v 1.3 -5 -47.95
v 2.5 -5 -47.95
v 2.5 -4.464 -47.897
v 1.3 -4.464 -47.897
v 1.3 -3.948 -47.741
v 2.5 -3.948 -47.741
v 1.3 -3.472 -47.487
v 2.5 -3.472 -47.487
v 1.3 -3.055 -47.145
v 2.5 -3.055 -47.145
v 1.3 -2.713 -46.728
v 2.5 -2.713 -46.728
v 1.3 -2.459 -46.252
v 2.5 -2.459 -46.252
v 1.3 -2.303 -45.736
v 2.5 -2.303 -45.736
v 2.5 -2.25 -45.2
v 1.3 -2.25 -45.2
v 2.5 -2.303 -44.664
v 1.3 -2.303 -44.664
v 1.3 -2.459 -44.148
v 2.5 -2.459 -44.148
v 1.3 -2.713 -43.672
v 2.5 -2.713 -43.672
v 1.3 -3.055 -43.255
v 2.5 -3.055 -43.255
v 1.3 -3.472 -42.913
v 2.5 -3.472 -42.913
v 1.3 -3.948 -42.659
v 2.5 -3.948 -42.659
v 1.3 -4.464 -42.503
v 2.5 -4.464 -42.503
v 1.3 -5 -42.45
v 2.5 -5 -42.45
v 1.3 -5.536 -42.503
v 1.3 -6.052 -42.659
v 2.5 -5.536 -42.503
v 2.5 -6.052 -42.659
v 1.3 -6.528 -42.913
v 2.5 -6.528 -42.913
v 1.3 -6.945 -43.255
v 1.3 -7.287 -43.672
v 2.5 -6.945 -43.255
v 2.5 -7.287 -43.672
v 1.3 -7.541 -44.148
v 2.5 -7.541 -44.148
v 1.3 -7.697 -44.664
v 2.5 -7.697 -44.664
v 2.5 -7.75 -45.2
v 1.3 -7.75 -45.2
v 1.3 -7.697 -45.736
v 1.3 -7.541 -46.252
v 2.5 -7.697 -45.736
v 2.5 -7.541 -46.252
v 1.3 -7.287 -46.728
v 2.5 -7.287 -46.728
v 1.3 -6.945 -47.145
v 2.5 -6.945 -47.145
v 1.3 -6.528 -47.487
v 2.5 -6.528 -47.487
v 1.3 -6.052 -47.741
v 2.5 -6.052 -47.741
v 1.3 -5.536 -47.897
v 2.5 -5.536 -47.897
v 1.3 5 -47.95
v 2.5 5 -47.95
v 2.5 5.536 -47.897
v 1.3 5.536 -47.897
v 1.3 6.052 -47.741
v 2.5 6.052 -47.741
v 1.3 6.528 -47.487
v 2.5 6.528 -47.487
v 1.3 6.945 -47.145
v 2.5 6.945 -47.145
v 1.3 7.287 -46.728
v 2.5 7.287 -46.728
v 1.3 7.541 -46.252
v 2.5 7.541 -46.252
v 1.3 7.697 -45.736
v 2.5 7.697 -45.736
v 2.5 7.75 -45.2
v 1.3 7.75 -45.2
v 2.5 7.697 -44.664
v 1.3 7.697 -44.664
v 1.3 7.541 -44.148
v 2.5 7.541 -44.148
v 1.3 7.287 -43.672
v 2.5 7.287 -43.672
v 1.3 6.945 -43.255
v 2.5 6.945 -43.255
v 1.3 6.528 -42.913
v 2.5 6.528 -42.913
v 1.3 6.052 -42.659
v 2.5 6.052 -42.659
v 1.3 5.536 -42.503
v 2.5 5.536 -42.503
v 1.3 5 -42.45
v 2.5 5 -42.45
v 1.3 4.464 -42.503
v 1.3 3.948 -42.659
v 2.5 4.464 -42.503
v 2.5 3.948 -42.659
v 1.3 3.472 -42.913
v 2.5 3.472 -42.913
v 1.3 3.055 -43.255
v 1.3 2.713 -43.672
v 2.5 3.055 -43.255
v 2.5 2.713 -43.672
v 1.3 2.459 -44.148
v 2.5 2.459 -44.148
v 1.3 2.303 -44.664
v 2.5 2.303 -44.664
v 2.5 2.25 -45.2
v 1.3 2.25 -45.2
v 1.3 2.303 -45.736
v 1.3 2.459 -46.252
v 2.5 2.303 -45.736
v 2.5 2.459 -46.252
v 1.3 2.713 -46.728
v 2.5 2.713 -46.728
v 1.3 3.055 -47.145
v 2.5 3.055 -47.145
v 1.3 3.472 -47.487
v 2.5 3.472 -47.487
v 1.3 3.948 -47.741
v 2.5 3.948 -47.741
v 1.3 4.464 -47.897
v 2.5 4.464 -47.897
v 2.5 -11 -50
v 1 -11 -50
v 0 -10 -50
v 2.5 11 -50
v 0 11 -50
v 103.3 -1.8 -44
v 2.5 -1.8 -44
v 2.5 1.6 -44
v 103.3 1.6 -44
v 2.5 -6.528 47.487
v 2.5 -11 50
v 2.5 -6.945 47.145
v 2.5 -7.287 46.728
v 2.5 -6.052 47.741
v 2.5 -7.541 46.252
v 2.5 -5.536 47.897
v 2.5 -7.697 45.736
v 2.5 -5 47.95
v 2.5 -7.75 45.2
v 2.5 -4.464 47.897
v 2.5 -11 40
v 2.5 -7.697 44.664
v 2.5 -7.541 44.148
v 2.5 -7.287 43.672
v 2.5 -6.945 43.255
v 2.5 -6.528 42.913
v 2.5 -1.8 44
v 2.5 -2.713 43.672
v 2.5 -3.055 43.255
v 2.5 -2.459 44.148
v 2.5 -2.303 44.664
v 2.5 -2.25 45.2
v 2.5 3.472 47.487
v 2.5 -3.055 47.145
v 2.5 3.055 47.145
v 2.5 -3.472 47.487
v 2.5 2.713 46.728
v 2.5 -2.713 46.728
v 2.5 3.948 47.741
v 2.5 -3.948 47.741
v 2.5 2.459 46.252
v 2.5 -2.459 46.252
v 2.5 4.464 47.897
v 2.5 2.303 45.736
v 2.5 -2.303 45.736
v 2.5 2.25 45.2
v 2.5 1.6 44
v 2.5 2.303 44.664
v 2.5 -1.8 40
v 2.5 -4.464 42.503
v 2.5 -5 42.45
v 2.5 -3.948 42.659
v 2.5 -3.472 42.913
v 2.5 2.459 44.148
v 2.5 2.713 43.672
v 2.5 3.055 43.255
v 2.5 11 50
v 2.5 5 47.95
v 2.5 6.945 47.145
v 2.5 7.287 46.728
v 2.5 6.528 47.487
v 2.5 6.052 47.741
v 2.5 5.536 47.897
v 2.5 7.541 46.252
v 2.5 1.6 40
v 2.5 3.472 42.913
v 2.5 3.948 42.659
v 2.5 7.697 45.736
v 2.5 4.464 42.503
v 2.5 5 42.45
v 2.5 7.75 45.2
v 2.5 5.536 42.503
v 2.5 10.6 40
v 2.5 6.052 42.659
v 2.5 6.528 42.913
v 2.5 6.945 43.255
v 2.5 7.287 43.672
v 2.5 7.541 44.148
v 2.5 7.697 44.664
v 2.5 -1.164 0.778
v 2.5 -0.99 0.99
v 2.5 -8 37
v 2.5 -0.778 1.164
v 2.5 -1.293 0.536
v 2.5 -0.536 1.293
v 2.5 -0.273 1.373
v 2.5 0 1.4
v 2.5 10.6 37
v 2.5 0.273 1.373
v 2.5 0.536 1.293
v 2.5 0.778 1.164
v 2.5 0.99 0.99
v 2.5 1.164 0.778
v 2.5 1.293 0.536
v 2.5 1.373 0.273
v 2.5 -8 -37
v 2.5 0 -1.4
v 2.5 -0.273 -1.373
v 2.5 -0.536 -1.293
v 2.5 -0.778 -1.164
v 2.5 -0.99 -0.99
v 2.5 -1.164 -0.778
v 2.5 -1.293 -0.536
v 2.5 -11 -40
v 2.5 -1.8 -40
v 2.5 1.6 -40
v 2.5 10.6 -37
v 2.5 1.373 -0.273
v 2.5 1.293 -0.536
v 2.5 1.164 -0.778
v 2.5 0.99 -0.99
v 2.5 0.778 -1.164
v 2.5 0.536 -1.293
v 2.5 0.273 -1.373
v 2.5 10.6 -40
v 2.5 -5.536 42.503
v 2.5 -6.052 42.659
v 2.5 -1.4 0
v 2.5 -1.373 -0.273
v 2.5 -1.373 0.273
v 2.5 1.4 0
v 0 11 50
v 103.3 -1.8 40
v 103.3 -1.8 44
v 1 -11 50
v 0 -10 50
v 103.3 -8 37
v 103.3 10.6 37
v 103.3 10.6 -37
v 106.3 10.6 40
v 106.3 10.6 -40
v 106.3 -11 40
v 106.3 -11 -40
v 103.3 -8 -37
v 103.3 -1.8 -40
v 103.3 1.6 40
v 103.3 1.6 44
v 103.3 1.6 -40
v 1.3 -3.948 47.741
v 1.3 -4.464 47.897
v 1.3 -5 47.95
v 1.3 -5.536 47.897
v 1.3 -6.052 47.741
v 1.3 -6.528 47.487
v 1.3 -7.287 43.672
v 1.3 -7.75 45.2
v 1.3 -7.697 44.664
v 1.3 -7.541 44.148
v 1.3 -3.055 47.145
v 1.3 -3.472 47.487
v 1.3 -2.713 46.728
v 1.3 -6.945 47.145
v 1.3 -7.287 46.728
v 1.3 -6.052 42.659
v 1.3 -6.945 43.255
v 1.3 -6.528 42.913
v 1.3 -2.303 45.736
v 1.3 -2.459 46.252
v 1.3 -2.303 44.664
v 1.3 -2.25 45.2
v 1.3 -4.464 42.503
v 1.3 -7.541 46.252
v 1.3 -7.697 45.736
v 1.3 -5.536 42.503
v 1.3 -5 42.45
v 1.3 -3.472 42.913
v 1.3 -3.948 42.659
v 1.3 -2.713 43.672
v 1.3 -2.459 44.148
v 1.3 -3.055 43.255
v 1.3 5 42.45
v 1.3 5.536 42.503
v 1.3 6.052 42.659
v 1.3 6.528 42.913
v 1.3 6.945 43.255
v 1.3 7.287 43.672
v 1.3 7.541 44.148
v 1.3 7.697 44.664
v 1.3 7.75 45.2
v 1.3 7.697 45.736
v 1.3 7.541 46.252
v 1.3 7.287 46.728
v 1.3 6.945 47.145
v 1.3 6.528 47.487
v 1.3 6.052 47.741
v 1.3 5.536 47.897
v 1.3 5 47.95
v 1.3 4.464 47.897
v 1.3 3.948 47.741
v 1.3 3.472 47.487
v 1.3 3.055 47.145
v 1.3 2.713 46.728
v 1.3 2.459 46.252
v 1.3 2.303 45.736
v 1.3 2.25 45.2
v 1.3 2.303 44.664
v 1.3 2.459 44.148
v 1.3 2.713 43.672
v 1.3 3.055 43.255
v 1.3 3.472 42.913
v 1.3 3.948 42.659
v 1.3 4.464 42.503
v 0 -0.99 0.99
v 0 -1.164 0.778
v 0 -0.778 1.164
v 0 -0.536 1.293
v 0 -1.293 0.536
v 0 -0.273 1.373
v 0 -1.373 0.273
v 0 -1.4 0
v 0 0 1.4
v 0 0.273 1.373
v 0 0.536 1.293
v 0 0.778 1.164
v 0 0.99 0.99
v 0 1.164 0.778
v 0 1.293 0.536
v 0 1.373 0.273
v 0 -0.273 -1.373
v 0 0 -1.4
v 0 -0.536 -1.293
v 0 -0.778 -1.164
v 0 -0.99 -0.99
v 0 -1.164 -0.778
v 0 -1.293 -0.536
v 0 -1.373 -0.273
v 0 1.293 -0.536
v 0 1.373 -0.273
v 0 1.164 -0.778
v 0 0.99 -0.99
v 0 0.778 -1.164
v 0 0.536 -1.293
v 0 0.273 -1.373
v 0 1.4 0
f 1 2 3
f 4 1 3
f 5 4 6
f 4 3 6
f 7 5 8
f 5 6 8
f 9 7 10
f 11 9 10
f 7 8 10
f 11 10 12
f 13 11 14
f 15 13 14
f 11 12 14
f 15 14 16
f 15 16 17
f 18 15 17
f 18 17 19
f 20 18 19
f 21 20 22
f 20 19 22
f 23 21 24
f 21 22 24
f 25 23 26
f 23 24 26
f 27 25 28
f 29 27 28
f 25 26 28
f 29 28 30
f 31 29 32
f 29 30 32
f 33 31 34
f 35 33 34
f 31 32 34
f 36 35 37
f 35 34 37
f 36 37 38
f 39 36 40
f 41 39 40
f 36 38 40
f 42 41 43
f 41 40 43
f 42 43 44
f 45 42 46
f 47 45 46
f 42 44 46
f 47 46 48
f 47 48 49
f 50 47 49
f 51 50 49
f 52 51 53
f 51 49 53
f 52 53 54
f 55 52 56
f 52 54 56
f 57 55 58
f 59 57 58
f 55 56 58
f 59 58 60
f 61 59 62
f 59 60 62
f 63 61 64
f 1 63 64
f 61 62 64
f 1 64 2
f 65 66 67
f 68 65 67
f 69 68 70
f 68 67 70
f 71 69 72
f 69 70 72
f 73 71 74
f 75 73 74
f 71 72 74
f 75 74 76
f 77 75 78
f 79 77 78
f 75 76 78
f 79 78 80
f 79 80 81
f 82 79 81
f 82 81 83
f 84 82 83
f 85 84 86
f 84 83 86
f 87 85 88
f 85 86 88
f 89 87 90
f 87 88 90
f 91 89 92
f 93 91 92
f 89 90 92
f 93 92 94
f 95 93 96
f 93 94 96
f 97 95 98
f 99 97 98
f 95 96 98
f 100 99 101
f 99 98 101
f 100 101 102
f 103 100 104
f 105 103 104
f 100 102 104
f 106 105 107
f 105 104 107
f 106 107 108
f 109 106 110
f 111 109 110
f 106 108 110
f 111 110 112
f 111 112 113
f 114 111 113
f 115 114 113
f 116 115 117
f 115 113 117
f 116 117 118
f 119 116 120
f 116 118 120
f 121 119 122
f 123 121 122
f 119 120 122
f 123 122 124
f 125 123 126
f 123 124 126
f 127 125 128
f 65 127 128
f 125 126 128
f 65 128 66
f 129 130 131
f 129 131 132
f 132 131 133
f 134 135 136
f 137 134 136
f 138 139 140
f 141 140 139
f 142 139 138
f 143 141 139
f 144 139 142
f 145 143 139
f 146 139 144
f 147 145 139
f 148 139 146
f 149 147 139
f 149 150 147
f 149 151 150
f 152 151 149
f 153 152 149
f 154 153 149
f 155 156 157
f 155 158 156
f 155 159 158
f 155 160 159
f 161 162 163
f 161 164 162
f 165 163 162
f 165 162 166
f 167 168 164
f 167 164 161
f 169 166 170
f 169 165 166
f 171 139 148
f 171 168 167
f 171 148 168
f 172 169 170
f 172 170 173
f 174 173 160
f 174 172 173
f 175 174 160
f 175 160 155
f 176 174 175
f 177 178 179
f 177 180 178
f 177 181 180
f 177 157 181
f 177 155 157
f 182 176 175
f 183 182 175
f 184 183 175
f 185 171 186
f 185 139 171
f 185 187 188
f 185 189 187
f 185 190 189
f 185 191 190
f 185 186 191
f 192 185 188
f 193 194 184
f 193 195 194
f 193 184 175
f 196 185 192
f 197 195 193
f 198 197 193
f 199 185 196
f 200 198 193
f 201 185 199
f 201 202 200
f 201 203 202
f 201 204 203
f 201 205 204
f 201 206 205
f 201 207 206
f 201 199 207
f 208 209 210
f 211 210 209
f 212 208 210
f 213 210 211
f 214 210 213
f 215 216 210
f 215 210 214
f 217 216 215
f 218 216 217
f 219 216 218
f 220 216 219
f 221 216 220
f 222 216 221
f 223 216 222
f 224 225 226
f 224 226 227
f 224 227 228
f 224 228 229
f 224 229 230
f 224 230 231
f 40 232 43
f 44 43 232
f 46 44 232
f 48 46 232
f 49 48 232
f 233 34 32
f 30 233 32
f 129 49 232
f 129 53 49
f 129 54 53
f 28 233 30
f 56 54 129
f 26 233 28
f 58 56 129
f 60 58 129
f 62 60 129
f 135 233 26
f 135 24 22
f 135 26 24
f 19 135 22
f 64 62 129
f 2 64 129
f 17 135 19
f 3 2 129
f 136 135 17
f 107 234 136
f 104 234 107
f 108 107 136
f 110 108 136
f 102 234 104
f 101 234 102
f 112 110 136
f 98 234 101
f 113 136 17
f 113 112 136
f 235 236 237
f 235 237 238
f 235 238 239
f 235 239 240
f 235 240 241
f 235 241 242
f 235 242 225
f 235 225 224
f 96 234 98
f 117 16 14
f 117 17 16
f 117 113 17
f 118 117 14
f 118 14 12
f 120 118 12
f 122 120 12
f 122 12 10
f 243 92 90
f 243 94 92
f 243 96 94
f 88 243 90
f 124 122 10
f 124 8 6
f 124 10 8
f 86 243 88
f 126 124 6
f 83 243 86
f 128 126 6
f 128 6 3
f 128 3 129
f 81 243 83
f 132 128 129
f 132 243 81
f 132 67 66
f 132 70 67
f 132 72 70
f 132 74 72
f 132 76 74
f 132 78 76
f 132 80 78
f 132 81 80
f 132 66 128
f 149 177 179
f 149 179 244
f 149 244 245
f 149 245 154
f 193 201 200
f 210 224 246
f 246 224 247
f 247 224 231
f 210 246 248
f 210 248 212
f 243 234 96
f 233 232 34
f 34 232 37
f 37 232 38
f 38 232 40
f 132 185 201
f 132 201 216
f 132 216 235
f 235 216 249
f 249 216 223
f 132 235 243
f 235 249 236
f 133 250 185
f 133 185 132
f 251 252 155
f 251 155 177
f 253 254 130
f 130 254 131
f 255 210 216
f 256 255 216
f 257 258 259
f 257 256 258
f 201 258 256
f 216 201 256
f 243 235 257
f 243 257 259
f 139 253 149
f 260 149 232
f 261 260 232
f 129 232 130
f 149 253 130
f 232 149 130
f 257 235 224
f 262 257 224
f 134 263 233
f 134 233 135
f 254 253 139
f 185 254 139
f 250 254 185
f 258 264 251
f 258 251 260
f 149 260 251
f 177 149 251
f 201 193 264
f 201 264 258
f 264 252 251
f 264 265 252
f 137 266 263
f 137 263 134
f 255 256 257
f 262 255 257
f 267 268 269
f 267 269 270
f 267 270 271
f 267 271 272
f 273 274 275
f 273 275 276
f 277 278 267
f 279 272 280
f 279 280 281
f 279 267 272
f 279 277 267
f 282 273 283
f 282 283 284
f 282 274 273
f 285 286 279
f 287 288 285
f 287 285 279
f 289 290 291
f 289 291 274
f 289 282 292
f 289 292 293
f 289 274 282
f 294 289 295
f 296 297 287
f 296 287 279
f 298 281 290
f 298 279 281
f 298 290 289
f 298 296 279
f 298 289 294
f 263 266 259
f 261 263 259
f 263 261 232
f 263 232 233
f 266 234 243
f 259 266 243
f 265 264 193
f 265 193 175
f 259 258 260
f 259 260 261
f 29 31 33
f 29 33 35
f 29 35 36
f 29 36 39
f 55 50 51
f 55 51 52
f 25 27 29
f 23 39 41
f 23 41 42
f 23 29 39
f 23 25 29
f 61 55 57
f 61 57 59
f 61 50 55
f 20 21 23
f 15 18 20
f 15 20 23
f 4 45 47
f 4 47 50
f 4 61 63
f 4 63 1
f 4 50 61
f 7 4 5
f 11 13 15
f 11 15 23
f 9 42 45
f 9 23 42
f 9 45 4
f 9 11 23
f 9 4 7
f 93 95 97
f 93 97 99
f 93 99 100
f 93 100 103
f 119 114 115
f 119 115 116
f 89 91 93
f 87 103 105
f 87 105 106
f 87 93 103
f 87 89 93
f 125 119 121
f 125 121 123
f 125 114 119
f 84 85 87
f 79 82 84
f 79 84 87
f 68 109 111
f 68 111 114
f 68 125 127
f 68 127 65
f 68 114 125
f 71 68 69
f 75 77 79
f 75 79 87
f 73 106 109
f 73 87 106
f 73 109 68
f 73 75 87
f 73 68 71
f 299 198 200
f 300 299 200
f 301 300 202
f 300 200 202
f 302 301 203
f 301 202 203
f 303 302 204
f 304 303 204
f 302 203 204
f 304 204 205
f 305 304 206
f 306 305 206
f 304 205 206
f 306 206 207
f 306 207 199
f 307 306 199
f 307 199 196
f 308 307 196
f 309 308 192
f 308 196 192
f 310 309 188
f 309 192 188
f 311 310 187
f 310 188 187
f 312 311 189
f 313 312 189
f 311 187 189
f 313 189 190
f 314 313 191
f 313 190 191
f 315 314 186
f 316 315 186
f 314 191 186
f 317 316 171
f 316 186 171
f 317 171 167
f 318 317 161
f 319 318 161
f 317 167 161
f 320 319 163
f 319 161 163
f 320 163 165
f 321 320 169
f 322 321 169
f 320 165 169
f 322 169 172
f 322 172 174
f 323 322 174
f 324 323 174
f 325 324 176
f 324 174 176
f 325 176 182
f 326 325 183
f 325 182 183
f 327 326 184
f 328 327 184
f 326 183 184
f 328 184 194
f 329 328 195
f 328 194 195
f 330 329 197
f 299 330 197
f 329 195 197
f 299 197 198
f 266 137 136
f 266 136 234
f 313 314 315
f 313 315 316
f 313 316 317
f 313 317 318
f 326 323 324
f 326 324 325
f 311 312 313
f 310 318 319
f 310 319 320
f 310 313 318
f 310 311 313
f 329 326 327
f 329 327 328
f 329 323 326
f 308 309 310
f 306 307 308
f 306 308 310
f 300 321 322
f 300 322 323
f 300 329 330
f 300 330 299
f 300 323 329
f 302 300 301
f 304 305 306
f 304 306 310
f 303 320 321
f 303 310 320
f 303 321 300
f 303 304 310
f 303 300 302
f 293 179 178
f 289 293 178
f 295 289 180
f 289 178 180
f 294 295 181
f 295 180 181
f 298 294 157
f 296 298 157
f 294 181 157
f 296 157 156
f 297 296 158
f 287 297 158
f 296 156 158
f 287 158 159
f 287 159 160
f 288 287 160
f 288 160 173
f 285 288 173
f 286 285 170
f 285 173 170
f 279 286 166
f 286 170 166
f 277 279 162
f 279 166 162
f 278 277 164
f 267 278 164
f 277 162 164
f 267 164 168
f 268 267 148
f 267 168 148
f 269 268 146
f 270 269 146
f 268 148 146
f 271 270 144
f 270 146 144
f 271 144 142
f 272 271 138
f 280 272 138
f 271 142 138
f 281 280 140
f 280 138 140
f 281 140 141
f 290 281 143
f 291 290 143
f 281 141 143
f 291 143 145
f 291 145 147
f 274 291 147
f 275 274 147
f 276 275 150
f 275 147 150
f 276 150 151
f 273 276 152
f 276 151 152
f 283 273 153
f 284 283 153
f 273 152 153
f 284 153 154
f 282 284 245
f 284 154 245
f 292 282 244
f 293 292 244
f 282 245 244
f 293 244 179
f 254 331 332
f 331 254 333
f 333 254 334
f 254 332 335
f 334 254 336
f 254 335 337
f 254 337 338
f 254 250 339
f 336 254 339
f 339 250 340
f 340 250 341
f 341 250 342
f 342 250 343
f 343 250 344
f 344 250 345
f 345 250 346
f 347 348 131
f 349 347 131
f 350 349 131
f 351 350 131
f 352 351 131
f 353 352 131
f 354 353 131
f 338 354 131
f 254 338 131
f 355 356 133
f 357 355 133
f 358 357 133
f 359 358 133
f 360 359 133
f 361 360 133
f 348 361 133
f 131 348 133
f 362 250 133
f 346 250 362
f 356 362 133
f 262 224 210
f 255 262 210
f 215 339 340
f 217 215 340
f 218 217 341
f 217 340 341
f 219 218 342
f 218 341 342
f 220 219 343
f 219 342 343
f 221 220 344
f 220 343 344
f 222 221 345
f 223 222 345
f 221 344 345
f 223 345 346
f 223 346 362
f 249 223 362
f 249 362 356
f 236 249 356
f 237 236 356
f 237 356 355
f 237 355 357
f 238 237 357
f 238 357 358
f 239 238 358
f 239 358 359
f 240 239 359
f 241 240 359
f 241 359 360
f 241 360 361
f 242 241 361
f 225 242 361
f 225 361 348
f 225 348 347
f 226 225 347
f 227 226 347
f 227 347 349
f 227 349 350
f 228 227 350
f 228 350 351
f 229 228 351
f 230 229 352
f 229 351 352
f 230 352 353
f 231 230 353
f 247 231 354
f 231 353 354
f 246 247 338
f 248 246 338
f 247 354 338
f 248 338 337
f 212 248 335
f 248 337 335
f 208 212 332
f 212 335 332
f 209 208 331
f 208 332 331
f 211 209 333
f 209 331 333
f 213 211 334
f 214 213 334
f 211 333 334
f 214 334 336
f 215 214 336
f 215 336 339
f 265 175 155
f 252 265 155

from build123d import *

# Parameters (mm, degrees)
CROQUIS1_W              = 100
CROQUIS1_H              = 22
SALIENTE_EXTRUIR1_DEPTH = 2.5
CROQUIS4_R              = 2.75
CORTAR_EXTRUIR2_DEPTH   = 1.2
SALIENTE_EXTRUIR2_DEPTH = 100.8
CROQUIS7_W              = 80
CROQUIS7_H              = 21.6
SALIENTE_EXTRUIR3_DEPTH = 3
CROQUIS8_R              = 1.4
CORTAR_EXTRUIR3_DEPTH   = 3
CHAFL_N1_SIZE           = 1


with BuildPart() as part:
    # Croquis1 → Saliente-Extruir1 (new body)
    with BuildSketch(Plane(origin=(0, 0, 0), x_dir=(0, 0, -1), z_dir=(1, 0, 0))):
        Rectangle(CROQUIS1_W, CROQUIS1_H)
    extrude(amount=SALIENTE_EXTRUIR1_DEPTH)

    # Croquis4 → Cortar-Extruir2 (cut)
    with BuildSketch(Plane(origin=(2.5, 0, 0), x_dir=(0, 0, -1), z_dir=(1, 0, 0))):
        with Locations((45.2, 5)):
            Circle(CROQUIS4_R)
        with Locations((45.2, -5)):
            Circle(CROQUIS4_R)
        with Locations((-45.2, 5)):
            Circle(CROQUIS4_R)
        with Locations((-45.2, -5)):
            Circle(CROQUIS4_R)
    extrude(amount=-CORTAR_EXTRUIR2_DEPTH, mode=Mode.SUBTRACT)

    # Croquis6 → Saliente-Extruir2 (add)
    with BuildSketch(Plane(origin=(2.5, 0, 0), x_dir=(0, 0, -1), z_dir=(1, 0, 0))):
        Polygon((-40, -11), (40, -11), (40, -1.8), (44, -1.8), (44, 1.6), (40, 1.6), (40, 10.6), (37, 10.6), (37, -8), (-37, -8), (-37, 10.6), (-40, 10.6), (-40, 1.6), (-44, 1.6), (-44, -1.8), (-40, -1.8), align=None)
    extrude(amount=SALIENTE_EXTRUIR2_DEPTH)

    # Croquis7 → Saliente-Extruir3 (add)
    with BuildSketch(Plane(origin=(103.3, 0, 0), x_dir=(0, 0, -1), z_dir=(1, 0, 0))):
        with Locations((0, -0.2)):
            Rectangle(CROQUIS7_W, CROQUIS7_H)
    extrude(amount=SALIENTE_EXTRUIR3_DEPTH)

    # Croquis8 → Cortar-Extruir3 (cut)
    with BuildSketch(Plane.ZY):
        Circle(CROQUIS8_R)
    extrude(amount=-CORTAR_EXTRUIR3_DEPTH, mode=Mode.SUBTRACT)

    # Chaflán1
    chafl_n1_edges = [part.edges().sort_by_distance(p)[0] for p in [
        (0, -11, 0),
    ]]
    chamfer(chafl_n1_edges, length=CHAFL_N1_SIZE)


solid = part.part
